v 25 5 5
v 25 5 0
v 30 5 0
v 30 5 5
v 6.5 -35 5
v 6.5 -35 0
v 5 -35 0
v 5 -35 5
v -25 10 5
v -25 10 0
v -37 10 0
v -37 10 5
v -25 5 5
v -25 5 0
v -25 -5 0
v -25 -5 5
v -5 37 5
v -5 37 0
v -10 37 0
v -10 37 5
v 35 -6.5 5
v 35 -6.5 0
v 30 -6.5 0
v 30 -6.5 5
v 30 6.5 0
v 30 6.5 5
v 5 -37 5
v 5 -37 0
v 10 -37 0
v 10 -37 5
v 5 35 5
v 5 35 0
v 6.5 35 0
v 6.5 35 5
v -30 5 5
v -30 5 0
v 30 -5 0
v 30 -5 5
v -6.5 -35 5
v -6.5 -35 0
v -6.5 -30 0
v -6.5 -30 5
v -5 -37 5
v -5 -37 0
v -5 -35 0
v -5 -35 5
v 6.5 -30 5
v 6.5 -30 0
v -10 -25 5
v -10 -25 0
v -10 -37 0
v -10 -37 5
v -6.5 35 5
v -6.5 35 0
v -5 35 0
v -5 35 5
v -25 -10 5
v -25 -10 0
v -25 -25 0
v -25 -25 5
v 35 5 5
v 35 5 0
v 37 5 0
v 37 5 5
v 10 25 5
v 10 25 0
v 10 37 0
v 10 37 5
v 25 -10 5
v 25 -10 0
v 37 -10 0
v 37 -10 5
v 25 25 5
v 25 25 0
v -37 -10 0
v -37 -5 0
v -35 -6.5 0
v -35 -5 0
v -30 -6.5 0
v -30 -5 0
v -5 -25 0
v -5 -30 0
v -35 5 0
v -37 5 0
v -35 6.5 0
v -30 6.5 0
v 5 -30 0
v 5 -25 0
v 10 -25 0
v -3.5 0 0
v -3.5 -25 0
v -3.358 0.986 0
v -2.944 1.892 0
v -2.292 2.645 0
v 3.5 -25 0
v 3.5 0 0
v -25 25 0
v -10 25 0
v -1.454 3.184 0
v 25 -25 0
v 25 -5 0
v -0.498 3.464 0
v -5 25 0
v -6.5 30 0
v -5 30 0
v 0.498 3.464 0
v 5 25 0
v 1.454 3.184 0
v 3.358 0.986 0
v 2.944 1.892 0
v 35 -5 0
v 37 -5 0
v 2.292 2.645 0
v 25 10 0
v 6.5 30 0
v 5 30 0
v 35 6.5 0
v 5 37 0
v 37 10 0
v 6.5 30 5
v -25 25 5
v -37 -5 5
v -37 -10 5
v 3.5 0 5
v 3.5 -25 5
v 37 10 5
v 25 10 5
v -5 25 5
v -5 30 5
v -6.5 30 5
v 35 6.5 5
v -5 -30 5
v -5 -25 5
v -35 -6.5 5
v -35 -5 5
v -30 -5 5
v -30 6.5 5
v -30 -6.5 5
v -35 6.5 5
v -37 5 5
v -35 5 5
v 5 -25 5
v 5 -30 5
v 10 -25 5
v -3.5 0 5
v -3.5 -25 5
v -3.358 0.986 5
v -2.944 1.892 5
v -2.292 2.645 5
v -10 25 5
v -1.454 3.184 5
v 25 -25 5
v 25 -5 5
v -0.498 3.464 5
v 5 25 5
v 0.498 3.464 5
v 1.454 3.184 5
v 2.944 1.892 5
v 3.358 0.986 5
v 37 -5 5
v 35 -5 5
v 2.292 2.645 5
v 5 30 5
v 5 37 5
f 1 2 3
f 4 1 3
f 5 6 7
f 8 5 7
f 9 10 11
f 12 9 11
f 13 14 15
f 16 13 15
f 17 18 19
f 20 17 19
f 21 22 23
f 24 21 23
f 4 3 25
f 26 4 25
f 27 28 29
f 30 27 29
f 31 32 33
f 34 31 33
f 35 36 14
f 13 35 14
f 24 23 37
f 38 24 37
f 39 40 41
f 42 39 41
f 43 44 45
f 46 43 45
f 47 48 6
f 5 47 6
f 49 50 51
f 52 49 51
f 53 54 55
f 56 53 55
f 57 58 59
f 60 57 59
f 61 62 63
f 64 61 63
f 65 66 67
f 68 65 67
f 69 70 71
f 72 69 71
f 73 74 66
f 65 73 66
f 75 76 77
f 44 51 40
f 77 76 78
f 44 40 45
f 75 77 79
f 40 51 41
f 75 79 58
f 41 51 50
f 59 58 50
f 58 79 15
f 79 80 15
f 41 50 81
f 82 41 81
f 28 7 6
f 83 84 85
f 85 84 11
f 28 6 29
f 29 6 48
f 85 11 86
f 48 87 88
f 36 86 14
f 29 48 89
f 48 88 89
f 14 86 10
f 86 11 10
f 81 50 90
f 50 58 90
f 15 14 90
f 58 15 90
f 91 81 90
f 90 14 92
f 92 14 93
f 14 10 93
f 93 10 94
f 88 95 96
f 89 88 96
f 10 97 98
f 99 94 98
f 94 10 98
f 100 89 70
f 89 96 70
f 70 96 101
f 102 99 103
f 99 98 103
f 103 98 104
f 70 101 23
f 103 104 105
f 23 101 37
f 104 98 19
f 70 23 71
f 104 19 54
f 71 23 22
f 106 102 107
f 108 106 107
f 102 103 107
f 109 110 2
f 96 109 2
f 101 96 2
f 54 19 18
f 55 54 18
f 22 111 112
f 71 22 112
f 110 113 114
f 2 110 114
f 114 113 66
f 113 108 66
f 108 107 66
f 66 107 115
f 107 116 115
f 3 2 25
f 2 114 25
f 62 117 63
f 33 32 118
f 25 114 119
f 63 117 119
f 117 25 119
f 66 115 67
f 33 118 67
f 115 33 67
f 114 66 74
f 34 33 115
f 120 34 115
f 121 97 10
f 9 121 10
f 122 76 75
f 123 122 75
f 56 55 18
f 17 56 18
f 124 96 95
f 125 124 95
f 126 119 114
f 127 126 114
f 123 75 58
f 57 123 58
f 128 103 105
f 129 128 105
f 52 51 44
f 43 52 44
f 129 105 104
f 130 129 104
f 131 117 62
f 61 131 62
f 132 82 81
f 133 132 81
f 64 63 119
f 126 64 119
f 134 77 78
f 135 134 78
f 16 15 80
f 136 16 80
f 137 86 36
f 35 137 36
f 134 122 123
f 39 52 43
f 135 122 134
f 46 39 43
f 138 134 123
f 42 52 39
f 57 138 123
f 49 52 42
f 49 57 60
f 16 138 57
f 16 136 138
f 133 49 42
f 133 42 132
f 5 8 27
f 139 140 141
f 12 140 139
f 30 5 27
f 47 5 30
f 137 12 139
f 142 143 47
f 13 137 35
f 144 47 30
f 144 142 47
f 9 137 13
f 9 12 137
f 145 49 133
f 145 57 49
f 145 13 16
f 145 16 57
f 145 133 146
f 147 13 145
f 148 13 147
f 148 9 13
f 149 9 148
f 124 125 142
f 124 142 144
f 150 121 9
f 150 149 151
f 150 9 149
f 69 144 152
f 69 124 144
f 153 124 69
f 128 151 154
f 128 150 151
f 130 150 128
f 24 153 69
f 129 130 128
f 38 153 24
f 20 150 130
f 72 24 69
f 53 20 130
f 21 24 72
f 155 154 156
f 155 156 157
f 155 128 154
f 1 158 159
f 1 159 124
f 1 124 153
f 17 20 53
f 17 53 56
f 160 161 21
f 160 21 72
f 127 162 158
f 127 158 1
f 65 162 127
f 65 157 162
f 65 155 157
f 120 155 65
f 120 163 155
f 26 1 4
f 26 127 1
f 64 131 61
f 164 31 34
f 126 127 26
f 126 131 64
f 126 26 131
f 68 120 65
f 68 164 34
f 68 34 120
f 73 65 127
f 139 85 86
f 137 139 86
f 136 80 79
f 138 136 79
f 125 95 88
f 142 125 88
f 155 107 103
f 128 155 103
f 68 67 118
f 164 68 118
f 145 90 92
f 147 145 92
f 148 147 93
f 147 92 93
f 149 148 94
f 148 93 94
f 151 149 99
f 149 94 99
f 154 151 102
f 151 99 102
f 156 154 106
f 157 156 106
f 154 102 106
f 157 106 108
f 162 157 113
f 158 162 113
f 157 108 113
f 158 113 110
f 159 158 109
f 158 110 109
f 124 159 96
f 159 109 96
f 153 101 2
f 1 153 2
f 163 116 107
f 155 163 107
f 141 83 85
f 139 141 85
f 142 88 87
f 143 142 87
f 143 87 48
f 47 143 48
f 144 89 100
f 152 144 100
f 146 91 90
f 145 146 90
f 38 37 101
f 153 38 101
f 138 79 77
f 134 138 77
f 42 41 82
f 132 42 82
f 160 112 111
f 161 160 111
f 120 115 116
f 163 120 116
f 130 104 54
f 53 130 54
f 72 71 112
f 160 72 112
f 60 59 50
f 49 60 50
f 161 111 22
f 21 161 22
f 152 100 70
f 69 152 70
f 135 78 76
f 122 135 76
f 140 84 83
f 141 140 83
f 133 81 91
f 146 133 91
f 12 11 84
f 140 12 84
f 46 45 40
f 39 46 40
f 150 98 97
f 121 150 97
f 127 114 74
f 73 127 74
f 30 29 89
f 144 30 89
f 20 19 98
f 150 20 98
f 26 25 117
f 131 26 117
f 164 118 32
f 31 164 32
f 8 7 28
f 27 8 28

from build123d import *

# Parameters (mm, degrees)
BOSS_EXTRU_1_DEPTH = 5


with BuildPart() as part:
    # Esquisse1 → Boss.-Extru.1 (new body)
    with BuildSketch(Plane.XY):
        with BuildLine():
            Line((-10, 25), (-25, 25))
            Line((-25, 25), (-25, 10))
            Line((-25, 10), (-30, 10))
            Line((-30, 10), (-37, 10))
            Line((-37, 10), (-37, 5))
            Line((-37, 5), (-35, 5))
            Line((-35, 5), (-35, 6.5))
            Line((-35, 6.5), (-30, 6.5))
            Line((-30, 6.5), (-30, 5))
            Line((-30, 5), (-25, 5))
            Line((-25, 5), (-25, 0))
            Line((-25, 0), (-25, -5))
            Line((-25, -5), (-30, -5))
            Line((-30, -5), (-30, -6.5))
            Line((-30, -6.5), (-35, -6.5))
            Line((-35, -6.5), (-35, -5))
            Line((-35, -5), (-37, -5))
            Line((-37, -5), (-37, -10))
            Line((-37, -10), (-30, -10))
            Line((-30, -10), (-25, -10))
            Line((-25, -10), (-25, -25))
            Line((-25, -25), (-10, -25))
            Line((-10, -25), (-10, -30))
            Line((-10, -30), (-10, -37))
            Line((-10, -37), (-5, -37))
            Line((-5, -37), (-5, -35))
            Line((-5, -35), (-6.5, -35))
            Line((-6.5, -35), (-6.5, -30))
            Line((-6.5, -30), (-5, -30))
            Line((-5, -30), (-5, -25))
            Line((-5, -25), (-3.5, -25))
            Line((-3.5, -25), (-3.5, 0))
            ThreePointArc((-3.5, 0), (0, 3.5), (3.5, 0))
            Line((3.5, 0), (3.5, -25))
            Line((3.5, -25), (5, -25))
            Line((5, -25), (5, -30))
            Line((5, -30), (6.5, -30))
            Line((6.5, -30), (6.5, -35))
            Line((6.5, -35), (5, -35))
            Line((5, -35), (5, -37))
            Line((5, -37), (10, -37))
            Line((10, -37), (10, -30))
            Line((10, -30), (10, -25))
            Line((10, -25), (25, -25))
            Line((25, -25), (25, -10))
            Line((25, -10), (30, -10))
            Line((30, -10), (37, -10))
            Line((37, -10), (37, -5))
            Line((37, -5), (35, -5))
            Line((35, -5), (35, -6.5))
            Line((35, -6.5), (30, -6.5))
            Line((30, -6.5), (30, -5))
            Line((30, -5), (25, -5))
            Line((25, -5), (25, 0))
            Line((25, 0), (25, 5))
            Line((25, 5), (30, 5))
            Line((30, 5), (30, 6.5))
            Line((30, 6.5), (35, 6.5))
            Line((35, 6.5), (35, 5))
            Line((35, 5), (37, 5))
            Line((37, 5), (37, 10))
            Line((37, 10), (30, 10))
            Line((30, 10), (25, 10))
            Line((25, 10), (25, 25))
            Line((25, 25), (10, 25))
            Line((10, 25), (10, 30))
            Line((10, 30), (10, 37))
            Line((10, 37), (5, 37))
            Line((5, 37), (5, 35))
            Line((5, 35), (6.5, 35))
            Line((6.5, 35), (6.5, 30))
            Line((6.5, 30), (5, 30))
            Line((5, 30), (5, 25))
            Line((5, 25), (0, 25))
            Line((0, 25), (-5, 25))
            Line((-5, 25), (-5, 30))
            Line((-5, 30), (-6.5, 30))
            Line((-6.5, 30), (-6.5, 35))
            Line((-6.5, 35), (-5, 35))
            Line((-5, 35), (-5, 37))
            Line((-5, 37), (-10, 37))
            Line((-10, 37), (-10, 30))
            Line((-10, 30), (-10, 25))
        make_face()
    extrude(amount=BOSS_EXTRU_1_DEPTH)


solid = part.part
